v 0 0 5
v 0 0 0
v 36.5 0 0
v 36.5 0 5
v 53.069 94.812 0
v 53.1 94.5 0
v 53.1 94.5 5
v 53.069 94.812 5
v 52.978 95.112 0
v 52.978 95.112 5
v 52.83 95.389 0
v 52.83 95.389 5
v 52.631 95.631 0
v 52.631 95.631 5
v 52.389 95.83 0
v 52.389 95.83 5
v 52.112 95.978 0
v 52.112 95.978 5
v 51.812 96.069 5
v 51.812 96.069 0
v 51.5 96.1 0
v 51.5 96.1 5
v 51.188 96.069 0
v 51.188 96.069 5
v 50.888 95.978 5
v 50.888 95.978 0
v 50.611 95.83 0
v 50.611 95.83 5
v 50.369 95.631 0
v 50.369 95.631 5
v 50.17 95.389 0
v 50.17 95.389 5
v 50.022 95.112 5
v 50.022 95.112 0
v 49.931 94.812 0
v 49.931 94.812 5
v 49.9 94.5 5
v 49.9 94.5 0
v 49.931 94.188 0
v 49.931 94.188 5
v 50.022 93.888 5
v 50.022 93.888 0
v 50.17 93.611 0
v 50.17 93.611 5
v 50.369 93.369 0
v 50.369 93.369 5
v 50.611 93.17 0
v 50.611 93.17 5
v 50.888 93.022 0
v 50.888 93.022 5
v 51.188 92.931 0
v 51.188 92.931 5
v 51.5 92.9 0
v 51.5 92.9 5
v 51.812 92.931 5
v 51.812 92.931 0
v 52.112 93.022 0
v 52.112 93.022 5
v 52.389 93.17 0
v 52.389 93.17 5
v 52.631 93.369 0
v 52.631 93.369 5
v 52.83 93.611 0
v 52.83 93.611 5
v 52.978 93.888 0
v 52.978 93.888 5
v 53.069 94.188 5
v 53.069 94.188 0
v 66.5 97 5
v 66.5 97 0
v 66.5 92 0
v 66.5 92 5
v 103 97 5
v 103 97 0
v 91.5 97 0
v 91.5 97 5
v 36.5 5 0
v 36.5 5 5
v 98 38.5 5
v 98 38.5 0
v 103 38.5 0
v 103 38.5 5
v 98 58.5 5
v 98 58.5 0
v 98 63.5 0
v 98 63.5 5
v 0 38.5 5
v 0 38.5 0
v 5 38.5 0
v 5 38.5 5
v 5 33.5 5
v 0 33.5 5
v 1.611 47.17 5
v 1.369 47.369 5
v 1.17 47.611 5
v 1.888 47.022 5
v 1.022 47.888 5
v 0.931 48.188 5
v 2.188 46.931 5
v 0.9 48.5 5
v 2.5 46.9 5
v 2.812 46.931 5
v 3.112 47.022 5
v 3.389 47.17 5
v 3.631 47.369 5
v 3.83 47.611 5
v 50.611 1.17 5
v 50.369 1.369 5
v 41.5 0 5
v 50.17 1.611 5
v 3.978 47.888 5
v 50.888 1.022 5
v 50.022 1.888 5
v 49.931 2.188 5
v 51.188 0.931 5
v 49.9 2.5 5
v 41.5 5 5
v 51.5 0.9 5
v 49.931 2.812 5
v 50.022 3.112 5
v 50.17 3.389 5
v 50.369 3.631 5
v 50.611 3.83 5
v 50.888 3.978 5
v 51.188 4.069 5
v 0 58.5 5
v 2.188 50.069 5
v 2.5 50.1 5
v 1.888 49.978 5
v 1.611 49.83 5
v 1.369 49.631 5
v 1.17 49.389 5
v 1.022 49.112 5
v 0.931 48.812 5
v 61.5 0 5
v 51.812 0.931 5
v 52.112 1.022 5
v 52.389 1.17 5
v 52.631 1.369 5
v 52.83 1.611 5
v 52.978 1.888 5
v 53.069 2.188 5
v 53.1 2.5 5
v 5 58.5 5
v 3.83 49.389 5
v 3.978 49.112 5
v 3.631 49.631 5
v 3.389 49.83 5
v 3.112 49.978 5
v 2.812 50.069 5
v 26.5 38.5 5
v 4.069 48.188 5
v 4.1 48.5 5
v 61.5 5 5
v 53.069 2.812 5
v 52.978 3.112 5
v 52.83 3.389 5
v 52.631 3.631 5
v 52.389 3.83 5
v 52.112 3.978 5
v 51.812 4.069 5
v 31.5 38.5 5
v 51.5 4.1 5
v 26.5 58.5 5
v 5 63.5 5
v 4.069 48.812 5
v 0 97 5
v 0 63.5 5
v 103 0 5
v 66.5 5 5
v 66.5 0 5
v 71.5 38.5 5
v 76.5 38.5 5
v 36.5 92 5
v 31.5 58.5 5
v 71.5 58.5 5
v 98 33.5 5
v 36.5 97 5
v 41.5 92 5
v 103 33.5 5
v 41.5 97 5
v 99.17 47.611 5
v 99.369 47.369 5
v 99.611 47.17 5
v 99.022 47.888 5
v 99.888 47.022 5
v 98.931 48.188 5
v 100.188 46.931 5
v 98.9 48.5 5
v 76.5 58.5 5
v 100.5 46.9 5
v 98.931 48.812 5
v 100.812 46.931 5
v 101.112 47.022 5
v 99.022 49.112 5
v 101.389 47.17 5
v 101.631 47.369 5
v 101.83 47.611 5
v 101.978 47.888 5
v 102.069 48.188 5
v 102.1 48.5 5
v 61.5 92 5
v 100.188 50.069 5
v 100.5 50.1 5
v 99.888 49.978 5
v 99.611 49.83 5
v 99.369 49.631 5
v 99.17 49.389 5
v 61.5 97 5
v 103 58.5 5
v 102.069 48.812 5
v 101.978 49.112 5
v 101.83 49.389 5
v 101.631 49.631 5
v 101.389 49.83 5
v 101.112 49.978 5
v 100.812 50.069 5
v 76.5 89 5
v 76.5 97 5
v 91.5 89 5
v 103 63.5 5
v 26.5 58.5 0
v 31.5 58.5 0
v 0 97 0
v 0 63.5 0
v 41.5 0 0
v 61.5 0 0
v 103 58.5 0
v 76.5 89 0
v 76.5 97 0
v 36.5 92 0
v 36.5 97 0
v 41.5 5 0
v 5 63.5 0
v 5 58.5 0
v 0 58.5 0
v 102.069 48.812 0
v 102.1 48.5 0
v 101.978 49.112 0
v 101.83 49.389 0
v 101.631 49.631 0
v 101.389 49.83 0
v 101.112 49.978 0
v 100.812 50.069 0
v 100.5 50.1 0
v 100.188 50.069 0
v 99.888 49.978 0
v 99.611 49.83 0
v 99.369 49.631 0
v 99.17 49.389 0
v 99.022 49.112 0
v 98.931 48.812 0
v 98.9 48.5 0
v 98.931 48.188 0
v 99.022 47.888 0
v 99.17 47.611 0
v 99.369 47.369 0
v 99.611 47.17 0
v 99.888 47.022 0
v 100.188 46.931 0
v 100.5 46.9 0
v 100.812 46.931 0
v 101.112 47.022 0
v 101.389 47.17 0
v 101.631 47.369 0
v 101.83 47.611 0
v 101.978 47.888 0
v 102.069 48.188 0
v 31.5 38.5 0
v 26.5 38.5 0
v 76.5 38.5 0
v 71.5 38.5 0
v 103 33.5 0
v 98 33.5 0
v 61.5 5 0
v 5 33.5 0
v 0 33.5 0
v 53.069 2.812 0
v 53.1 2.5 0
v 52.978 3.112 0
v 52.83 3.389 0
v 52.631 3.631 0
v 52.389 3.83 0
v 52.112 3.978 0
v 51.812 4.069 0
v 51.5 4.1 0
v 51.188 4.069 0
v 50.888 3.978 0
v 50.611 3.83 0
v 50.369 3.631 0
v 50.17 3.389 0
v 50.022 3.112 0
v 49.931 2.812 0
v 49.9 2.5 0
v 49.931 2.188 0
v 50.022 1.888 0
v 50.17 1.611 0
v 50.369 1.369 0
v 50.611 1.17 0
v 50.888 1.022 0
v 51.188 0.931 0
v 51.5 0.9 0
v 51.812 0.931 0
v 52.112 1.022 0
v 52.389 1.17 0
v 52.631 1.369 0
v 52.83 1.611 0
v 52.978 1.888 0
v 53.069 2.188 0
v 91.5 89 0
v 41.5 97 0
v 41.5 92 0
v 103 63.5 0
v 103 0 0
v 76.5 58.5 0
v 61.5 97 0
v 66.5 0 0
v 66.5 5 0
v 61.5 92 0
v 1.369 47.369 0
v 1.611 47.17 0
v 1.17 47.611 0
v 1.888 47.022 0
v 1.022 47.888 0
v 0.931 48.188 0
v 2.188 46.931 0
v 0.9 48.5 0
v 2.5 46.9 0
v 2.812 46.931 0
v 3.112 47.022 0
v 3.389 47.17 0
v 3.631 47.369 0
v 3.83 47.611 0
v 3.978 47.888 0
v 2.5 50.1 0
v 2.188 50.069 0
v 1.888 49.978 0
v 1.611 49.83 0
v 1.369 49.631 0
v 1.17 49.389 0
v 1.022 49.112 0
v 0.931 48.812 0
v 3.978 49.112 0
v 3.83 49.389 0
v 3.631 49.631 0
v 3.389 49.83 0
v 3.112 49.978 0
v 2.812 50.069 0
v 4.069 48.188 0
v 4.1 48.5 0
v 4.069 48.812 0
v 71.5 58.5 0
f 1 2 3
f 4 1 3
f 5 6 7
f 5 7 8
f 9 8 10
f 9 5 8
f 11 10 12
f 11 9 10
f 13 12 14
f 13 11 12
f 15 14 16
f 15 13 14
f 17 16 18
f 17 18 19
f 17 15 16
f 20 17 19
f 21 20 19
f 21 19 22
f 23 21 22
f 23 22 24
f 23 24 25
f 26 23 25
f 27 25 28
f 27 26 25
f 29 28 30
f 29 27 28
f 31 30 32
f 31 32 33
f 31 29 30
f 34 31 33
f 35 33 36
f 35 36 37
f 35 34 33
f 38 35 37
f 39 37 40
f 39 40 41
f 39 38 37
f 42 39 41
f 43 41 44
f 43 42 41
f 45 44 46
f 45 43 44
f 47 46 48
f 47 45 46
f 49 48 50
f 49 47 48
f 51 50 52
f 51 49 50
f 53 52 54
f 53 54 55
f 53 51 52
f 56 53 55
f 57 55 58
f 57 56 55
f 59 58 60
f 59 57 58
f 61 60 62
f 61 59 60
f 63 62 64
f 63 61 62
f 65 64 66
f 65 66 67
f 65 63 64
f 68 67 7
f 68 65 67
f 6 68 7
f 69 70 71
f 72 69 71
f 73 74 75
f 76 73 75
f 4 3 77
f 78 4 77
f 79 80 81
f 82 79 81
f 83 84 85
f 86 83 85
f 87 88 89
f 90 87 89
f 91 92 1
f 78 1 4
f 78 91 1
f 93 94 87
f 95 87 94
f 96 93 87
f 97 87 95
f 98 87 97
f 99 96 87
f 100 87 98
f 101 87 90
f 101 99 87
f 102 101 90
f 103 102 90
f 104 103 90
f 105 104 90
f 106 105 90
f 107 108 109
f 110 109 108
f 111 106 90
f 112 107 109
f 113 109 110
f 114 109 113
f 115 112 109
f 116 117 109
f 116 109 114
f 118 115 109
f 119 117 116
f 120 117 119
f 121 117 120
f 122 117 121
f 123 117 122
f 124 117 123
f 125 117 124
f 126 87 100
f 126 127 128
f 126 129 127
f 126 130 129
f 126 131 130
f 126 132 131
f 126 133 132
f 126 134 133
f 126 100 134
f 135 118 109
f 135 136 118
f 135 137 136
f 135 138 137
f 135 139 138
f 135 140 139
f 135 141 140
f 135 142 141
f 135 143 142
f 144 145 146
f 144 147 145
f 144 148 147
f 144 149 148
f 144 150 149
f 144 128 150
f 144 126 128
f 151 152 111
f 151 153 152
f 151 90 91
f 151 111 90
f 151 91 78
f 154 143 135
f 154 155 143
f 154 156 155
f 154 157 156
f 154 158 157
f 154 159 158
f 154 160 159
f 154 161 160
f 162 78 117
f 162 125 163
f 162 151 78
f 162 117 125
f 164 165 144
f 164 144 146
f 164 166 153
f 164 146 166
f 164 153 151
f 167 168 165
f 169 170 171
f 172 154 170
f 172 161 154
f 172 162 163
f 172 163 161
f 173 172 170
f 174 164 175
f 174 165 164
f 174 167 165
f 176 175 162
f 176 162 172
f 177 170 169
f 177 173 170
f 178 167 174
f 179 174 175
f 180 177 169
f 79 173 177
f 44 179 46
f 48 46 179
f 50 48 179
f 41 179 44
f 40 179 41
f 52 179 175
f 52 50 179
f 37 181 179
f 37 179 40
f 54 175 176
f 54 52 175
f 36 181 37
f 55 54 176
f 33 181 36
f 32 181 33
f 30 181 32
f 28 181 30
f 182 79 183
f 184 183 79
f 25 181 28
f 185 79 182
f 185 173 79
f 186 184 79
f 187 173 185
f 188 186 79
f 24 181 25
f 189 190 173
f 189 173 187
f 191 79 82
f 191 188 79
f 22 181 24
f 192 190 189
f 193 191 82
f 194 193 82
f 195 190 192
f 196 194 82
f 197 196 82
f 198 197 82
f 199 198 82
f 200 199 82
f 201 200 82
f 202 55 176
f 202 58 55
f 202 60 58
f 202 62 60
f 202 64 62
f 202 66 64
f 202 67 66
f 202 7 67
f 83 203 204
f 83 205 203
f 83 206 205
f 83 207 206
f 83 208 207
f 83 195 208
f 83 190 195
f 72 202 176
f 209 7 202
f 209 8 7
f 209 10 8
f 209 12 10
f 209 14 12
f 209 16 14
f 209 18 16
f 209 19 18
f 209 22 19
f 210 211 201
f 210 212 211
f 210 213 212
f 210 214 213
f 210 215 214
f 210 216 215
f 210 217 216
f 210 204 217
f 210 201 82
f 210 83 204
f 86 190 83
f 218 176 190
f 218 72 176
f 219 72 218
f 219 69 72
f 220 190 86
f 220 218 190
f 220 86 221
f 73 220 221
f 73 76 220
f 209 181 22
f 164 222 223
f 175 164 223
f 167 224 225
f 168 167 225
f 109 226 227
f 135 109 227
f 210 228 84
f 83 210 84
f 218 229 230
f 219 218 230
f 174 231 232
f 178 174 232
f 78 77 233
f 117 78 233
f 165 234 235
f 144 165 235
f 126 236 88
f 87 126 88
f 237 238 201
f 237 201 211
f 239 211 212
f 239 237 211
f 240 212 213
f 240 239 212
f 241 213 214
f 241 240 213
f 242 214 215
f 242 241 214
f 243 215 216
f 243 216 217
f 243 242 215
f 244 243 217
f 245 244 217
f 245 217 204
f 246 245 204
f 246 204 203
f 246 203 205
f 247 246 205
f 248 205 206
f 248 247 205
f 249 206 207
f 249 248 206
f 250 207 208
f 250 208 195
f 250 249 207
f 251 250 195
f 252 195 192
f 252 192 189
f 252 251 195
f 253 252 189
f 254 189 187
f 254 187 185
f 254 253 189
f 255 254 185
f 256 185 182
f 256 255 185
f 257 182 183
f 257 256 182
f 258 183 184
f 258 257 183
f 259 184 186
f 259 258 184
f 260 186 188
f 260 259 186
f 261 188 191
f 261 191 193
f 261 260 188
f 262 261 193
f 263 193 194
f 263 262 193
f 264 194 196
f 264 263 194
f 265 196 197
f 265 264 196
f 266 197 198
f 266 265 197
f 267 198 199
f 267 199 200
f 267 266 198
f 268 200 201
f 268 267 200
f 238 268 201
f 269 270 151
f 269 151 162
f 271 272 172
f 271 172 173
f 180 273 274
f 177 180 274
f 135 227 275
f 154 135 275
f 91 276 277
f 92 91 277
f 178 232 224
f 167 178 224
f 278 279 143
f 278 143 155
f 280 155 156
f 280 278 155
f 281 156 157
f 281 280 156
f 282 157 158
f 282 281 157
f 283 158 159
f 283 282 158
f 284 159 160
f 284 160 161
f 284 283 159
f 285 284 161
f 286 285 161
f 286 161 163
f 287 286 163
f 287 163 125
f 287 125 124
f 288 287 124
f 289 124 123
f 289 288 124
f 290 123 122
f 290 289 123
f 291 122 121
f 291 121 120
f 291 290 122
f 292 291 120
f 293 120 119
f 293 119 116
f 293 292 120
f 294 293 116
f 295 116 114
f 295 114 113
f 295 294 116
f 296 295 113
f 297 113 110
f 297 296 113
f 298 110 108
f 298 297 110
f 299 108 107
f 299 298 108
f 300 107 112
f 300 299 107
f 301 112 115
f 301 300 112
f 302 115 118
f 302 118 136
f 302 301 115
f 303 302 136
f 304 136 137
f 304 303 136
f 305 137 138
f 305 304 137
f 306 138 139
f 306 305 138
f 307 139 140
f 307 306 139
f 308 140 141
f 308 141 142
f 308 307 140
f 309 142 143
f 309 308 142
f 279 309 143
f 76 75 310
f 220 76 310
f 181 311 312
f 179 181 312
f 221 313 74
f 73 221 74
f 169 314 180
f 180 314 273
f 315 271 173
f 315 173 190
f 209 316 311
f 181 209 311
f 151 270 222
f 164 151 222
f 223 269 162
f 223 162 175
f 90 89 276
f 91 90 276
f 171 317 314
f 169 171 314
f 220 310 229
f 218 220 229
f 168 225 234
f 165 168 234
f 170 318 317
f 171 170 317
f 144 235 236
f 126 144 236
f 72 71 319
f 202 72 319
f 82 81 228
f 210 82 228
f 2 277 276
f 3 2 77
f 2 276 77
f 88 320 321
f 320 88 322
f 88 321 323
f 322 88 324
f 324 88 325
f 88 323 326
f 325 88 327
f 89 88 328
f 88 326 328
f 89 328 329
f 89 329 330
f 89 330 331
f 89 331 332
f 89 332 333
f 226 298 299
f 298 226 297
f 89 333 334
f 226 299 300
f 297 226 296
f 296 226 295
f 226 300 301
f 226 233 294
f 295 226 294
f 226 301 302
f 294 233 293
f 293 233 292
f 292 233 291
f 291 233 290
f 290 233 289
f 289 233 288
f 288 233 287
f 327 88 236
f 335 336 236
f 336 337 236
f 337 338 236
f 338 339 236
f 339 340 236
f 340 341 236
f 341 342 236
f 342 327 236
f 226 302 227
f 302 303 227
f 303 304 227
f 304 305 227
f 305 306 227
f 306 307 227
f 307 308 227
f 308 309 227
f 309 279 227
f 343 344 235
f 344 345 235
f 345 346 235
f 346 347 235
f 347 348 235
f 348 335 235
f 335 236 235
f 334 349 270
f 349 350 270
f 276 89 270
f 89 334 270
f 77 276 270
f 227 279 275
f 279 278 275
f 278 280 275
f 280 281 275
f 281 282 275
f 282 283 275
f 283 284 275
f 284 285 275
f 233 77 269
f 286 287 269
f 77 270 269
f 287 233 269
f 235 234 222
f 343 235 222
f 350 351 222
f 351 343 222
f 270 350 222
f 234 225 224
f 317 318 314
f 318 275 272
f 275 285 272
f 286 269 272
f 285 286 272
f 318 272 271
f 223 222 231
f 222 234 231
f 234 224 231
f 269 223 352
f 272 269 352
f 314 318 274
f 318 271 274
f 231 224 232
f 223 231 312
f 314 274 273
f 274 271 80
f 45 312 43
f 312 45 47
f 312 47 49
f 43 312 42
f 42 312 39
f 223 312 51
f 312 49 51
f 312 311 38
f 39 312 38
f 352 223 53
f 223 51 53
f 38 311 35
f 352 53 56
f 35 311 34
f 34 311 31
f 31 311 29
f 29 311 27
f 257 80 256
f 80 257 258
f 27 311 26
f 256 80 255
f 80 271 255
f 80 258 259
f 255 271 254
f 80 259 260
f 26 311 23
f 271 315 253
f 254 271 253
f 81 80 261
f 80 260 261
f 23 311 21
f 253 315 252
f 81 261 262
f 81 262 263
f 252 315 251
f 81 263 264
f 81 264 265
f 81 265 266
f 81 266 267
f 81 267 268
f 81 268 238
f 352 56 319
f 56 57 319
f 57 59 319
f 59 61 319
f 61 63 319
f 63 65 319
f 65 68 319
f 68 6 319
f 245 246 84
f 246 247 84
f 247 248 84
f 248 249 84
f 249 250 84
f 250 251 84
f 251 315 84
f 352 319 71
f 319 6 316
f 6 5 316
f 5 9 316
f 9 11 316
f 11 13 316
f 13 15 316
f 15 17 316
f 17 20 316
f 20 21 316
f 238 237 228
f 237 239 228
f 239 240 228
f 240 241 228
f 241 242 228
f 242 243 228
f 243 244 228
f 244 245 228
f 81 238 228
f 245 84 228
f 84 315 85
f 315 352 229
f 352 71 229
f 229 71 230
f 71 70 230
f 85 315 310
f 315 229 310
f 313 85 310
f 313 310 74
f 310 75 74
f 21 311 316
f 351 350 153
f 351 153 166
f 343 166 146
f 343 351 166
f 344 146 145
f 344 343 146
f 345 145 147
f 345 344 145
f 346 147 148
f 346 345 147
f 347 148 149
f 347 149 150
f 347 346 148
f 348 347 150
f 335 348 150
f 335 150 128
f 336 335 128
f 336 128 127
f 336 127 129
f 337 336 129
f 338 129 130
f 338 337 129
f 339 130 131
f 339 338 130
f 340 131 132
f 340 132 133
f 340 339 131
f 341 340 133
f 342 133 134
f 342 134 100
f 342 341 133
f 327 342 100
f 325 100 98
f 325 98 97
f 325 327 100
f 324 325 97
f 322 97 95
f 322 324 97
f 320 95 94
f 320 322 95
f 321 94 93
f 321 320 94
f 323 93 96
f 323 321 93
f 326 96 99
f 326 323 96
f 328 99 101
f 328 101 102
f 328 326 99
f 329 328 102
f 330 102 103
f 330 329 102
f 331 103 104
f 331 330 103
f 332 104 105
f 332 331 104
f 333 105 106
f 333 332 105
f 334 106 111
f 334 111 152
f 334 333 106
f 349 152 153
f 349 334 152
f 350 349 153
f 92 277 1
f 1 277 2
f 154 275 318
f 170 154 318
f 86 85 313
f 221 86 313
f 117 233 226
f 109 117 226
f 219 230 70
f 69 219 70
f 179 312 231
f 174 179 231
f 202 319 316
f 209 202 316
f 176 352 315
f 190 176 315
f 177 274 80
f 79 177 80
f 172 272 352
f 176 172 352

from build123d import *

# Parameters (mm, degrees)
F1_R     = 1.6
F1_W     = 5
F1_H     = 20
F2_DEPTH = 5


with BuildPart() as f2:
    # F1 (on Top) → F2 (new body)
    with BuildSketch(Plane.XY):
        Polygon((41.5, 97), (41.5, 92), (36.5, 92), (36.5, 97), (0, 97), (0, 63.5), (5, 63.5), (5, 58.5), (0, 58.5), (0, 38.5), (5, 38.5), (5, 33.5), (0, 33.5), (0, 0), (36.5, 0), (36.5, 5), (41.5, 5), (41.5, 0), (61.5, 0), (61.5, 5), (66.5, 5), (66.5, 0), (103, 0), (103, 33.5), (98, 33.5), (98, 38.5), (103, 38.5), (103, 58.5), (98, 58.5), (98, 63.5), (103, 63.5), (103, 97), (91.5, 97), (91.5, 89), (76.5, 89), (76.5, 97), (66.5, 97), (66.5, 92), (61.5, 92), (61.5, 97), align=None)
        with Locations((51.5, 2.5)):
            Circle(F1_R, mode=Mode.SUBTRACT)
        with Locations((2.5, 48.5)):
            Circle(F1_R, mode=Mode.SUBTRACT)
        with Locations((29, 48.5)):
            Rectangle(F1_W, F1_H, mode=Mode.SUBTRACT)
        with Locations((51.5, 94.5)):
            Circle(F1_R, mode=Mode.SUBTRACT)
        with Locations((74, 48.5)):
            Rectangle(F1_W, F1_H, mode=Mode.SUBTRACT)
        with Locations((100.5, 48.5)):
            Circle(F1_R, mode=Mode.SUBTRACT)
    extrude(amount=F2_DEPTH)


solid = f2.part
